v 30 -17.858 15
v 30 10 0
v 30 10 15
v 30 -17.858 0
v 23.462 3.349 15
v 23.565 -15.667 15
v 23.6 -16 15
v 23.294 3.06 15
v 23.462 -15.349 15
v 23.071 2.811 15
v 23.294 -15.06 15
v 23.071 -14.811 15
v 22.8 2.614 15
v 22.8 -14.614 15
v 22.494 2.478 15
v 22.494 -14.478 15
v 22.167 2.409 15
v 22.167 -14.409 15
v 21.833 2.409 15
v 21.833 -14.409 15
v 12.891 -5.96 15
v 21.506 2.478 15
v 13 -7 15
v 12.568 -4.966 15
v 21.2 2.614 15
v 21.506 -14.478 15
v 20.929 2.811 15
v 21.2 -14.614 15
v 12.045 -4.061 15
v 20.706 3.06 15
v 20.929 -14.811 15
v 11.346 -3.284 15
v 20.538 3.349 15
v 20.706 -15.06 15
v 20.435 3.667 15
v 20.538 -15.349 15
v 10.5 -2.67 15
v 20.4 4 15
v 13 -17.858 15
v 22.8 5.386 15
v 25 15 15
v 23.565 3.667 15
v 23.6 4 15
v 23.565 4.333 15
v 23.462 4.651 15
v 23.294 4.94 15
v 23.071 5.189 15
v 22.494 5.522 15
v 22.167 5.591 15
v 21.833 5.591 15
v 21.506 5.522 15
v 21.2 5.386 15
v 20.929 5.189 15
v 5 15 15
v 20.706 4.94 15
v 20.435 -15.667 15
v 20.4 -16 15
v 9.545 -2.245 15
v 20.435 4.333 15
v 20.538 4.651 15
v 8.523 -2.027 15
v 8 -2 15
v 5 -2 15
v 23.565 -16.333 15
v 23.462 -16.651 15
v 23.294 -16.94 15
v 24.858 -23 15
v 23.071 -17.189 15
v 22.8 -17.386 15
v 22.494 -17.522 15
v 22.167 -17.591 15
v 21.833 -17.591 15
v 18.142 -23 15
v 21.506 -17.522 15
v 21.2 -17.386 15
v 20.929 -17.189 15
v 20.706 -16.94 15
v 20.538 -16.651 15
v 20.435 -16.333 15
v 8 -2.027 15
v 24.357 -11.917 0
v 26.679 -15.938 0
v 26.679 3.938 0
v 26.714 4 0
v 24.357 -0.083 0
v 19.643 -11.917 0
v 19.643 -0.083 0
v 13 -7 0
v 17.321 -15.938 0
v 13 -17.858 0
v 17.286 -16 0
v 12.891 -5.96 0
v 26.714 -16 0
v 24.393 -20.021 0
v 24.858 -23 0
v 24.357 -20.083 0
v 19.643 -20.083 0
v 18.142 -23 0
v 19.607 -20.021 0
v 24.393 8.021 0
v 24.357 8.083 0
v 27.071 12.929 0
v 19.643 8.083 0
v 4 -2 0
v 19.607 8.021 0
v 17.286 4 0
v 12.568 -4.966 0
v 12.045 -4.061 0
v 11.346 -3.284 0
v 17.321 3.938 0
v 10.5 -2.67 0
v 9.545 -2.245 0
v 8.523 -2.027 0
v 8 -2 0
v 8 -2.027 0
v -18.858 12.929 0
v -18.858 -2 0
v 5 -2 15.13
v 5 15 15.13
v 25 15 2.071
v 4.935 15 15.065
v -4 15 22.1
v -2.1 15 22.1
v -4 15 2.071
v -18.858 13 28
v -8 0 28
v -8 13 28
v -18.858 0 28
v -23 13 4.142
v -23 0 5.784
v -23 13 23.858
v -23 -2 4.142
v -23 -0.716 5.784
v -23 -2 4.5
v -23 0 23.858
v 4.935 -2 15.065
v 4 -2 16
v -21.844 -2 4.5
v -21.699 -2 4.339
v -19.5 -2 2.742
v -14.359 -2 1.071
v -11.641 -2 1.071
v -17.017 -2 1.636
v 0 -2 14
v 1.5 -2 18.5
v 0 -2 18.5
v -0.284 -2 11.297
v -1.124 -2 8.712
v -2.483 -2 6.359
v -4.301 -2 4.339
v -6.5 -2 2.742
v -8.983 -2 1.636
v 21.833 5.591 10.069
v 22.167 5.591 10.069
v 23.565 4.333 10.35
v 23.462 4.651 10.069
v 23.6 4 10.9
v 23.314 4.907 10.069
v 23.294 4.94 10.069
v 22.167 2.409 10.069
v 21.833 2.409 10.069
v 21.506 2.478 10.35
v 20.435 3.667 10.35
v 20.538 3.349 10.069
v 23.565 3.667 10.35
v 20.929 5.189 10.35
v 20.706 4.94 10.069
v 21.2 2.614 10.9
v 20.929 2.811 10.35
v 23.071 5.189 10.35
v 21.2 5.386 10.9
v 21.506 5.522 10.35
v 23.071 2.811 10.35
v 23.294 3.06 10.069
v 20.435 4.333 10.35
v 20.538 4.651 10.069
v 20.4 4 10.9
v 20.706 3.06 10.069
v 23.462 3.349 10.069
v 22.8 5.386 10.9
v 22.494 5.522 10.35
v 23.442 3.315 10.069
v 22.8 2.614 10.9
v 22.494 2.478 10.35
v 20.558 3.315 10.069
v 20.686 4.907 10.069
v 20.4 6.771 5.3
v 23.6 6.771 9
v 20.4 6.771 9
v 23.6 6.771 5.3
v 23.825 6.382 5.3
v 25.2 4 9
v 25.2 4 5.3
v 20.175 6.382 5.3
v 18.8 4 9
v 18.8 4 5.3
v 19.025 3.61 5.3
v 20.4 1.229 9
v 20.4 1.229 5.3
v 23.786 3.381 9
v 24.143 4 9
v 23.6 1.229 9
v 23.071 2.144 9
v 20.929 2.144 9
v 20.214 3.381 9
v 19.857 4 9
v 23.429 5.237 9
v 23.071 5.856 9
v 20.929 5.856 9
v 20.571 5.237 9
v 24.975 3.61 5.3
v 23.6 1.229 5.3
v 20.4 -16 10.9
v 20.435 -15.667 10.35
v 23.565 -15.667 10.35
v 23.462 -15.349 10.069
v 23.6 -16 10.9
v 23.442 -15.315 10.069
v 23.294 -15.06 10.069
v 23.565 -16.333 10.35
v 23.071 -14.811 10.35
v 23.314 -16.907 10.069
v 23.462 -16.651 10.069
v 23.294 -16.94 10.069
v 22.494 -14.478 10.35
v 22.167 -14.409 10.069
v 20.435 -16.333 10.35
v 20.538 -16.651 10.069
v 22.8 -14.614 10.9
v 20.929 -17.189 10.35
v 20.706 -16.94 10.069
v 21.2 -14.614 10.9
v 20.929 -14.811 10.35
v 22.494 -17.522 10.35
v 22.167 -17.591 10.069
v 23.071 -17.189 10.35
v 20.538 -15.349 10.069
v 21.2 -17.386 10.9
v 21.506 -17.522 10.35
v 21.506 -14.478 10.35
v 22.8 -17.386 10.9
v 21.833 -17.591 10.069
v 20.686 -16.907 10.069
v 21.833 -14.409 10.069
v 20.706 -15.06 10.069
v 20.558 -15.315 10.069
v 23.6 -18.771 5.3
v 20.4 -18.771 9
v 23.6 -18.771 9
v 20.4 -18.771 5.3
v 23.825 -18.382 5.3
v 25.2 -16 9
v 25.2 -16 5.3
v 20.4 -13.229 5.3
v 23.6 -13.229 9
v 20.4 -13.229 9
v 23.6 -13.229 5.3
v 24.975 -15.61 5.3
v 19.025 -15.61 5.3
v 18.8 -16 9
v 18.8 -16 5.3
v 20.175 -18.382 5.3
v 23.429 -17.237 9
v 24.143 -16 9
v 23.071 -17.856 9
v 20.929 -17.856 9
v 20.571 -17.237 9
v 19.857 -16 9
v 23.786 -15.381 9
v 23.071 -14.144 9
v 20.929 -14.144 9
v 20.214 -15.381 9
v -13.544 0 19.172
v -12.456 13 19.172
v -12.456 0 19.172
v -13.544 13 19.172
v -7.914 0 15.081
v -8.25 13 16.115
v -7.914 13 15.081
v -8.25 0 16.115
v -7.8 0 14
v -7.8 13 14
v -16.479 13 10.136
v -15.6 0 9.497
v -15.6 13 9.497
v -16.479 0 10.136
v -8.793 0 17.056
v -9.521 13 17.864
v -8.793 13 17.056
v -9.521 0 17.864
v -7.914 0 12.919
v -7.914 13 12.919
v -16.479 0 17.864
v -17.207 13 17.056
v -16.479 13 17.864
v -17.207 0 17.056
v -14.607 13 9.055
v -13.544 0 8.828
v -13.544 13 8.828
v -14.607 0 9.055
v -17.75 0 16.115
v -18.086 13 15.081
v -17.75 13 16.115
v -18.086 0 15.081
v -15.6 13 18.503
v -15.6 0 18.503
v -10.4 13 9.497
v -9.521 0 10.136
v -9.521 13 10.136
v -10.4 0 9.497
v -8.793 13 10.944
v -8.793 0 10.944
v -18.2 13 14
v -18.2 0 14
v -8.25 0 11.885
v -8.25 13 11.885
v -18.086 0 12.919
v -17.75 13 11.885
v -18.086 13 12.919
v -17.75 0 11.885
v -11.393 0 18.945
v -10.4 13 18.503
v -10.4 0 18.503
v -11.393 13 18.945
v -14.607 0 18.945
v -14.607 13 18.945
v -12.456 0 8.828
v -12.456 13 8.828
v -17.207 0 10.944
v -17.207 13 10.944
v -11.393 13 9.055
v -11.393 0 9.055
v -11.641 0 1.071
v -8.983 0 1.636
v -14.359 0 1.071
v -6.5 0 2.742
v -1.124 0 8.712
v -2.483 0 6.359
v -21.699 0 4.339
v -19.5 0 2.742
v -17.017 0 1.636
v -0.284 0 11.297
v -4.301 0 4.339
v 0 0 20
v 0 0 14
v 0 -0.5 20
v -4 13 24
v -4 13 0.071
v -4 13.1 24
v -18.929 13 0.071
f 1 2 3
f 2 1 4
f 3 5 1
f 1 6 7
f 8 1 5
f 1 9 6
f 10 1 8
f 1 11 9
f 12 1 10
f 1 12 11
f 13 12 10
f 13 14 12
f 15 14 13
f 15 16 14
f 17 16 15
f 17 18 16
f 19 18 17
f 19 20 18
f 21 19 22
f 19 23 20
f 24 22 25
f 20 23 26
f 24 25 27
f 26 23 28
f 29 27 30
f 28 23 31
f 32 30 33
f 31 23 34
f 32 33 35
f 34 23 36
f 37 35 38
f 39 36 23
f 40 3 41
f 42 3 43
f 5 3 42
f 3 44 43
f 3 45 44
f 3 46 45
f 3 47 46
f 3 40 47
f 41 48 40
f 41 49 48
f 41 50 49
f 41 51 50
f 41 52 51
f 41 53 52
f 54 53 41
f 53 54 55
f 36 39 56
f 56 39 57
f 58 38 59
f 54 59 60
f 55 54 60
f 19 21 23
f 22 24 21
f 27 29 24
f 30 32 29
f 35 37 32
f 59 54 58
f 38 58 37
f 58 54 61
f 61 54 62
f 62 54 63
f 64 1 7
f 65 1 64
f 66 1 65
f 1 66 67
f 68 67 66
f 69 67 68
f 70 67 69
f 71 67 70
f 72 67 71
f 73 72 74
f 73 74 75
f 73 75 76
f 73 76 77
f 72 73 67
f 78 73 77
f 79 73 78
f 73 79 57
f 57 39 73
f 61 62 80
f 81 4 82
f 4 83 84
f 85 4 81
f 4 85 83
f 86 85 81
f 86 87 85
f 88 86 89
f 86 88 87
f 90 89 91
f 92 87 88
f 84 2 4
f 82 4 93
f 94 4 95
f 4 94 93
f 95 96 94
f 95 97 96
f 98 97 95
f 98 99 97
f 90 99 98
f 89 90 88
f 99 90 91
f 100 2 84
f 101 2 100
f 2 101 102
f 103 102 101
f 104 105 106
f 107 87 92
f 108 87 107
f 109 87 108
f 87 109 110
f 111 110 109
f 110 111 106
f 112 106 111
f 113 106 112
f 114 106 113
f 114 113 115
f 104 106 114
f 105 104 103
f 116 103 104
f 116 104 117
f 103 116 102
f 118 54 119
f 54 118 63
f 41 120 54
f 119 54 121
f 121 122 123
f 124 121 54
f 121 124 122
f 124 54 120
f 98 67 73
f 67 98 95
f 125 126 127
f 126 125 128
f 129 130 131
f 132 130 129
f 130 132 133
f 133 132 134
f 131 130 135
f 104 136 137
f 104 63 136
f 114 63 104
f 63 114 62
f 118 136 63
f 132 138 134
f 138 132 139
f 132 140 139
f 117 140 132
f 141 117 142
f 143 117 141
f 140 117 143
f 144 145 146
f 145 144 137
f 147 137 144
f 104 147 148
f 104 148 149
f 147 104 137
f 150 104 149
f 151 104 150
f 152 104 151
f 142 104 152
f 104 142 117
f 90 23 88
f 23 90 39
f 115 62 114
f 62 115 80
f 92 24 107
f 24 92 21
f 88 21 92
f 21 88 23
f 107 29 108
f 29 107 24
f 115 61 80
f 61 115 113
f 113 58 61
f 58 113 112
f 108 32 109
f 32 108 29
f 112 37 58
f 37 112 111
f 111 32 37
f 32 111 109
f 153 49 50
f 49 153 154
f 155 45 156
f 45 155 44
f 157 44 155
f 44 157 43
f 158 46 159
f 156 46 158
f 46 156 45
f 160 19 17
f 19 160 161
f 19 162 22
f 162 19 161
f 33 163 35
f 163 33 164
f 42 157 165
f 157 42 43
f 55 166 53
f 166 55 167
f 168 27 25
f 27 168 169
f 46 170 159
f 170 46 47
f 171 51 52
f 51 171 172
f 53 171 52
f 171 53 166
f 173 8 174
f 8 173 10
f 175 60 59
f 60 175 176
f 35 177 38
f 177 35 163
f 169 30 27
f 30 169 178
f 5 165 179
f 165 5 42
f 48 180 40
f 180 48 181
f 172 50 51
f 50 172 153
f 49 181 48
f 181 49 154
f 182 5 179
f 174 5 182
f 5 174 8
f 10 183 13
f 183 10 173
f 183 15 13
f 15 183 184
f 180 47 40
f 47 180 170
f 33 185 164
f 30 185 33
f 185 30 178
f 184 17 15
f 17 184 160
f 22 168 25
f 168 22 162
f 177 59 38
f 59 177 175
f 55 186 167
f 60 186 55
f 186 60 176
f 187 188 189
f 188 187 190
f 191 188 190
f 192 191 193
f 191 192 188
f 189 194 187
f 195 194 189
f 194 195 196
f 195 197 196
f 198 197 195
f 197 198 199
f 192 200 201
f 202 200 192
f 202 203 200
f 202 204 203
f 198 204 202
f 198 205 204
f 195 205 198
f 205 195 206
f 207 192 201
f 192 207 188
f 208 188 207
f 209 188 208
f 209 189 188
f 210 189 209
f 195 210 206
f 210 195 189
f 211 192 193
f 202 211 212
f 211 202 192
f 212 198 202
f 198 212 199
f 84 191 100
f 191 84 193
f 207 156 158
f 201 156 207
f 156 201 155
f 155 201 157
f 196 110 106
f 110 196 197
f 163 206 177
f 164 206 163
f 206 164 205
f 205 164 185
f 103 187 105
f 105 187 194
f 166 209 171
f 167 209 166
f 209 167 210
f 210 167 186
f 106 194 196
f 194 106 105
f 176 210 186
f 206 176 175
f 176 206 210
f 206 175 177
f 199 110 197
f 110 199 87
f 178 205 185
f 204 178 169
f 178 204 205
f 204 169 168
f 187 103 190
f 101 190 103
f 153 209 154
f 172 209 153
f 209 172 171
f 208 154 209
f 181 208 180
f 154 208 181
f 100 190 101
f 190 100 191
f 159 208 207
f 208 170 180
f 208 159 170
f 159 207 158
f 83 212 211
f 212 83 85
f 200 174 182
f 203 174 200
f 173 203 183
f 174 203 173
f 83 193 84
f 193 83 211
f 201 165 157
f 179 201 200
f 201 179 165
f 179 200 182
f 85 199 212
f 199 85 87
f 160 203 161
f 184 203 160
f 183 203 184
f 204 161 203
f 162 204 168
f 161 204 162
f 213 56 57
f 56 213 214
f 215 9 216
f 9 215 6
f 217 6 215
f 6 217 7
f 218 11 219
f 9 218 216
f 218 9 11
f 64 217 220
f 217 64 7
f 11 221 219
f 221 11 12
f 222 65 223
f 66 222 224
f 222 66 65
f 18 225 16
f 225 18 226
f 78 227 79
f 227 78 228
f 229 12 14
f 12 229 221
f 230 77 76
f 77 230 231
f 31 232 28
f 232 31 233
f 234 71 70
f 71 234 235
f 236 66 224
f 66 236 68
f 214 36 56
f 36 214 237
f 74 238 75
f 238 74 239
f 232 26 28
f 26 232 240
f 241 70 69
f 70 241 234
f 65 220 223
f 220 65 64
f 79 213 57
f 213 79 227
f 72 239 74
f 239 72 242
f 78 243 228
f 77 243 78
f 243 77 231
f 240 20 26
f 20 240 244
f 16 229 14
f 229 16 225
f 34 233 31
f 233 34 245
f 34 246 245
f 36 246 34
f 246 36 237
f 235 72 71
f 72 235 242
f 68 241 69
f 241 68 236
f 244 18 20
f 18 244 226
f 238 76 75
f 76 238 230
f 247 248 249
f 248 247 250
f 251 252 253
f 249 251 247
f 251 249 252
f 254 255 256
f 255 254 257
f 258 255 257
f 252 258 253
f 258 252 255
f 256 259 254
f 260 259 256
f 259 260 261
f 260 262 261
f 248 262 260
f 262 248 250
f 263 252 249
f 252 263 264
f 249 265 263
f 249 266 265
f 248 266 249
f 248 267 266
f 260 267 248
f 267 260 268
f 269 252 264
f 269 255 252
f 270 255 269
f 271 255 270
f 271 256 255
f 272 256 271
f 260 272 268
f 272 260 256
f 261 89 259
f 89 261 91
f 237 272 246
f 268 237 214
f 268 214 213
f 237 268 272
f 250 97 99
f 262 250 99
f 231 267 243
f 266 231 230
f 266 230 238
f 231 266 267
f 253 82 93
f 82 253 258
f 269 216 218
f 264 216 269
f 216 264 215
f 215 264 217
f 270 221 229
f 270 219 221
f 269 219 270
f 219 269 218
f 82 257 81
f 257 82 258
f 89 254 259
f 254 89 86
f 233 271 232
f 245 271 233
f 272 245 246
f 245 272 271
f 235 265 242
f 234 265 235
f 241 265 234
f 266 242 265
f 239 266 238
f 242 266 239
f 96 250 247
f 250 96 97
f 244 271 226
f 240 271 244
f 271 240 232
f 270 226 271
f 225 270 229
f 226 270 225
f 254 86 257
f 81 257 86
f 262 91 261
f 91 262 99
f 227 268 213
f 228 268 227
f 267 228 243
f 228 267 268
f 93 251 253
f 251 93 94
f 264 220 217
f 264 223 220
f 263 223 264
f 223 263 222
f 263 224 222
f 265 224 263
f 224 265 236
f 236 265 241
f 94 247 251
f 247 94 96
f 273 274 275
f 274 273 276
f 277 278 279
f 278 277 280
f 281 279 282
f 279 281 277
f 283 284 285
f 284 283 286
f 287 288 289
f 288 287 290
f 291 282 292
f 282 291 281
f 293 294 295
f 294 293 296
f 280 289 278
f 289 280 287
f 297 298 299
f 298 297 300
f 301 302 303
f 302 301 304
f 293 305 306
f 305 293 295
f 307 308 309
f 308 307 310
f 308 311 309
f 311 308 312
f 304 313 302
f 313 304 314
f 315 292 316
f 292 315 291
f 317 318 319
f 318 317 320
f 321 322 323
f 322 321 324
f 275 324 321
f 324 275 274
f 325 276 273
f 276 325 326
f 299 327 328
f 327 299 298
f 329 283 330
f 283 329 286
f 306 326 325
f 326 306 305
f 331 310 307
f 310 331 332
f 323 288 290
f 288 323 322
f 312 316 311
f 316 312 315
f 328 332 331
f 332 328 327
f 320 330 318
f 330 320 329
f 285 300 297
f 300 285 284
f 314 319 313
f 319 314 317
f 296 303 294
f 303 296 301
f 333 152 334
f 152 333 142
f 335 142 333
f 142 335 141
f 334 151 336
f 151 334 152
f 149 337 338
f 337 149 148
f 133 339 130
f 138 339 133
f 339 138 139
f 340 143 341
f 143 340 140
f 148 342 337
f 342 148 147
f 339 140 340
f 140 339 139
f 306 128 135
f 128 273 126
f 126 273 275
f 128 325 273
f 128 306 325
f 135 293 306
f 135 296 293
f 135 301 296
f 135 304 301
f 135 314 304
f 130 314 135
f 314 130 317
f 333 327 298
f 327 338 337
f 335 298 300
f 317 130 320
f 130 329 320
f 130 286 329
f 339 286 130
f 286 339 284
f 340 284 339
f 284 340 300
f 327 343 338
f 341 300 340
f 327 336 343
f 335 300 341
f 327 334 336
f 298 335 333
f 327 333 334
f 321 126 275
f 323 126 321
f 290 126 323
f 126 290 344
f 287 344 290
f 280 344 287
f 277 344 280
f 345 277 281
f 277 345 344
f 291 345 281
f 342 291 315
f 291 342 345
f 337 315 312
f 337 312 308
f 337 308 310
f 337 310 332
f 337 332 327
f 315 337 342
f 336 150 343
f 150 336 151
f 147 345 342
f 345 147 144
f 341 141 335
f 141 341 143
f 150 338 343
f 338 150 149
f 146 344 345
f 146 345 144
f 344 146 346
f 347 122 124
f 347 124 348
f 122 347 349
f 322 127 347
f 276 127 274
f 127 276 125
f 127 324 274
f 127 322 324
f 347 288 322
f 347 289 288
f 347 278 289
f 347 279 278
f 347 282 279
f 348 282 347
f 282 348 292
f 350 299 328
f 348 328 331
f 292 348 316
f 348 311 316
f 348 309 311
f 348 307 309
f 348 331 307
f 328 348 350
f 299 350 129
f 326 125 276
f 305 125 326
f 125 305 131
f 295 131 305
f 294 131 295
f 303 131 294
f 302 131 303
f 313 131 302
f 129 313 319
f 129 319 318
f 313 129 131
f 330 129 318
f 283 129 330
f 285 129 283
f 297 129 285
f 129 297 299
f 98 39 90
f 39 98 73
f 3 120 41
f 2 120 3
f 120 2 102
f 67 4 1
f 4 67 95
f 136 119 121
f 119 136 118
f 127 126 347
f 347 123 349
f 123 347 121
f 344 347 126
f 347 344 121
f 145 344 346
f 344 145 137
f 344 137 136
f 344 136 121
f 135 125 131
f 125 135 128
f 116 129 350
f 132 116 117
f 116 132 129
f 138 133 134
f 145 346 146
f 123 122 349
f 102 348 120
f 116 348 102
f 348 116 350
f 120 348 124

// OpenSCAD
// PRUSA iteration3
// PSU-Y reinforcement part 
// GNU GPL v3
// Josef Průša <iam@josefprusa.cz> and contributors
// http://www.reprap.org/wiki/Prusa_Mendel
// http://prusamendel.org

module base()
{
union(){
    difference(){
        union(){
        translate([ 5, -23, 0 ]) cube([ 25, 38, 15 ]);  // horizontal plate
        translate([ -23, -2, 0 ]) cube([ 28, 17, 28 ]);  // Y_Corner block    
        }
        translate( [ 4 , -25 , -1 ] ) cube( [ 9 , 23 , 18 ] );  //  holder side cut
    }
    difference(){    
        translate([ 8, -7, 0 ]) cube([ 5, 5, 15 ]);  // fillet block
        translate([ 8, -7, -1 ]) cylinder( h = 28, r = 5, $fn=30);  // fillet cut
        }
    }
}


module cutout()
    {
    translate([ 22, 4 , -2 ]) cylinder( h = 20, r = 1.6, $fn=30);  // M3 hole A
    translate([ 22, 4 , -1 ]) cylinder( h = 10, r = 3.2, $fn=6);  // M3 nut body A        
    translate([ 22, 4 , -1 ]) cylinder( h = 14, r1 = 3.2, r1 = 5, $fn=6);  // M3 nut hole fillet A
        
    translate([ 22, -16 , -2 ]) cylinder( h = 20, r = 1.6, $fn=30);  // M3 hole B
    translate([ 22, -16 , -1 ]) cylinder( h = 10, r = 3.2, $fn=6);  // M3 nut body B
    translate([ 22, -16 , -1 ]) cylinder( h = 14, r1 = 3.2, r1 = 5, $fn=6);  // M3 nut hole B fillet

    translate([ -13, 14 , 14 ]) rotate([90,0,0]) cylinder( h = 25, r = 5.2, $fn=30);  // threaded rod
    
    translate([ -13, 0 , 14 ]) rotate([90,0,0]) cylinder( h = 4, r = 13, $fn=30);  // washer
    translate([ -29, -7 , 14 ])  cube([ 29, 7, 18 ]);  // washer upper cut
    
    translate([ -24, 13 , -1 ]) cube([ 20, 15, 30 ]);  // Y_Corner cutaway

    //vertical corners 45 degree cut
    translate( [ 12, -31 , -2 ] ) rotate( [0,0,45] ) cube([ 10 , 10 , 21 ]);  
    translate([ 31,  9, -2 ])  rotate( [0,0,45] ) cube([ 10, 10, 21 ]);  
    translate([ 31, -31, -2 ]) rotate( [0,0,45] ) cube([ 10, 10, 21 ]);  

    // horizontal corners 45 degree cut
    translate([ -8.5, -8, 28.5 ]) rotate( [0,45,0] ) cube([ 19, 40, 20 ]);  
    translate([ -31, -6, 30 ]) rotate( [0,45,0])  cube([ 10, 35, 10 ]);  
    translate([ -31, -6, -2 ]) rotate( [0,45,0] ) cube([ 10, 35, 10 ]);  
    translate([ -26, -4,  2.5 ]) rotate( [45,0,0] ) cube([ 5, 5, 5 ]);  
    translate([ -1, -4, 16.5 ]) rotate( [45,0,0] ) cube([ 5, 5, 5 ]);  
    translate([ -5, 16.6, 20.5 ]) rotate( [45,0,0] ) cube([ 5, 5, 5 ]);  
    translate([ -30, 15, -5 ]) rotate( [45,0,0] ) cube([ 70, 5, 5 ]);  
}

module final_part(){
difference()
{
    base();
    cutout();
    }
}

final_part();
